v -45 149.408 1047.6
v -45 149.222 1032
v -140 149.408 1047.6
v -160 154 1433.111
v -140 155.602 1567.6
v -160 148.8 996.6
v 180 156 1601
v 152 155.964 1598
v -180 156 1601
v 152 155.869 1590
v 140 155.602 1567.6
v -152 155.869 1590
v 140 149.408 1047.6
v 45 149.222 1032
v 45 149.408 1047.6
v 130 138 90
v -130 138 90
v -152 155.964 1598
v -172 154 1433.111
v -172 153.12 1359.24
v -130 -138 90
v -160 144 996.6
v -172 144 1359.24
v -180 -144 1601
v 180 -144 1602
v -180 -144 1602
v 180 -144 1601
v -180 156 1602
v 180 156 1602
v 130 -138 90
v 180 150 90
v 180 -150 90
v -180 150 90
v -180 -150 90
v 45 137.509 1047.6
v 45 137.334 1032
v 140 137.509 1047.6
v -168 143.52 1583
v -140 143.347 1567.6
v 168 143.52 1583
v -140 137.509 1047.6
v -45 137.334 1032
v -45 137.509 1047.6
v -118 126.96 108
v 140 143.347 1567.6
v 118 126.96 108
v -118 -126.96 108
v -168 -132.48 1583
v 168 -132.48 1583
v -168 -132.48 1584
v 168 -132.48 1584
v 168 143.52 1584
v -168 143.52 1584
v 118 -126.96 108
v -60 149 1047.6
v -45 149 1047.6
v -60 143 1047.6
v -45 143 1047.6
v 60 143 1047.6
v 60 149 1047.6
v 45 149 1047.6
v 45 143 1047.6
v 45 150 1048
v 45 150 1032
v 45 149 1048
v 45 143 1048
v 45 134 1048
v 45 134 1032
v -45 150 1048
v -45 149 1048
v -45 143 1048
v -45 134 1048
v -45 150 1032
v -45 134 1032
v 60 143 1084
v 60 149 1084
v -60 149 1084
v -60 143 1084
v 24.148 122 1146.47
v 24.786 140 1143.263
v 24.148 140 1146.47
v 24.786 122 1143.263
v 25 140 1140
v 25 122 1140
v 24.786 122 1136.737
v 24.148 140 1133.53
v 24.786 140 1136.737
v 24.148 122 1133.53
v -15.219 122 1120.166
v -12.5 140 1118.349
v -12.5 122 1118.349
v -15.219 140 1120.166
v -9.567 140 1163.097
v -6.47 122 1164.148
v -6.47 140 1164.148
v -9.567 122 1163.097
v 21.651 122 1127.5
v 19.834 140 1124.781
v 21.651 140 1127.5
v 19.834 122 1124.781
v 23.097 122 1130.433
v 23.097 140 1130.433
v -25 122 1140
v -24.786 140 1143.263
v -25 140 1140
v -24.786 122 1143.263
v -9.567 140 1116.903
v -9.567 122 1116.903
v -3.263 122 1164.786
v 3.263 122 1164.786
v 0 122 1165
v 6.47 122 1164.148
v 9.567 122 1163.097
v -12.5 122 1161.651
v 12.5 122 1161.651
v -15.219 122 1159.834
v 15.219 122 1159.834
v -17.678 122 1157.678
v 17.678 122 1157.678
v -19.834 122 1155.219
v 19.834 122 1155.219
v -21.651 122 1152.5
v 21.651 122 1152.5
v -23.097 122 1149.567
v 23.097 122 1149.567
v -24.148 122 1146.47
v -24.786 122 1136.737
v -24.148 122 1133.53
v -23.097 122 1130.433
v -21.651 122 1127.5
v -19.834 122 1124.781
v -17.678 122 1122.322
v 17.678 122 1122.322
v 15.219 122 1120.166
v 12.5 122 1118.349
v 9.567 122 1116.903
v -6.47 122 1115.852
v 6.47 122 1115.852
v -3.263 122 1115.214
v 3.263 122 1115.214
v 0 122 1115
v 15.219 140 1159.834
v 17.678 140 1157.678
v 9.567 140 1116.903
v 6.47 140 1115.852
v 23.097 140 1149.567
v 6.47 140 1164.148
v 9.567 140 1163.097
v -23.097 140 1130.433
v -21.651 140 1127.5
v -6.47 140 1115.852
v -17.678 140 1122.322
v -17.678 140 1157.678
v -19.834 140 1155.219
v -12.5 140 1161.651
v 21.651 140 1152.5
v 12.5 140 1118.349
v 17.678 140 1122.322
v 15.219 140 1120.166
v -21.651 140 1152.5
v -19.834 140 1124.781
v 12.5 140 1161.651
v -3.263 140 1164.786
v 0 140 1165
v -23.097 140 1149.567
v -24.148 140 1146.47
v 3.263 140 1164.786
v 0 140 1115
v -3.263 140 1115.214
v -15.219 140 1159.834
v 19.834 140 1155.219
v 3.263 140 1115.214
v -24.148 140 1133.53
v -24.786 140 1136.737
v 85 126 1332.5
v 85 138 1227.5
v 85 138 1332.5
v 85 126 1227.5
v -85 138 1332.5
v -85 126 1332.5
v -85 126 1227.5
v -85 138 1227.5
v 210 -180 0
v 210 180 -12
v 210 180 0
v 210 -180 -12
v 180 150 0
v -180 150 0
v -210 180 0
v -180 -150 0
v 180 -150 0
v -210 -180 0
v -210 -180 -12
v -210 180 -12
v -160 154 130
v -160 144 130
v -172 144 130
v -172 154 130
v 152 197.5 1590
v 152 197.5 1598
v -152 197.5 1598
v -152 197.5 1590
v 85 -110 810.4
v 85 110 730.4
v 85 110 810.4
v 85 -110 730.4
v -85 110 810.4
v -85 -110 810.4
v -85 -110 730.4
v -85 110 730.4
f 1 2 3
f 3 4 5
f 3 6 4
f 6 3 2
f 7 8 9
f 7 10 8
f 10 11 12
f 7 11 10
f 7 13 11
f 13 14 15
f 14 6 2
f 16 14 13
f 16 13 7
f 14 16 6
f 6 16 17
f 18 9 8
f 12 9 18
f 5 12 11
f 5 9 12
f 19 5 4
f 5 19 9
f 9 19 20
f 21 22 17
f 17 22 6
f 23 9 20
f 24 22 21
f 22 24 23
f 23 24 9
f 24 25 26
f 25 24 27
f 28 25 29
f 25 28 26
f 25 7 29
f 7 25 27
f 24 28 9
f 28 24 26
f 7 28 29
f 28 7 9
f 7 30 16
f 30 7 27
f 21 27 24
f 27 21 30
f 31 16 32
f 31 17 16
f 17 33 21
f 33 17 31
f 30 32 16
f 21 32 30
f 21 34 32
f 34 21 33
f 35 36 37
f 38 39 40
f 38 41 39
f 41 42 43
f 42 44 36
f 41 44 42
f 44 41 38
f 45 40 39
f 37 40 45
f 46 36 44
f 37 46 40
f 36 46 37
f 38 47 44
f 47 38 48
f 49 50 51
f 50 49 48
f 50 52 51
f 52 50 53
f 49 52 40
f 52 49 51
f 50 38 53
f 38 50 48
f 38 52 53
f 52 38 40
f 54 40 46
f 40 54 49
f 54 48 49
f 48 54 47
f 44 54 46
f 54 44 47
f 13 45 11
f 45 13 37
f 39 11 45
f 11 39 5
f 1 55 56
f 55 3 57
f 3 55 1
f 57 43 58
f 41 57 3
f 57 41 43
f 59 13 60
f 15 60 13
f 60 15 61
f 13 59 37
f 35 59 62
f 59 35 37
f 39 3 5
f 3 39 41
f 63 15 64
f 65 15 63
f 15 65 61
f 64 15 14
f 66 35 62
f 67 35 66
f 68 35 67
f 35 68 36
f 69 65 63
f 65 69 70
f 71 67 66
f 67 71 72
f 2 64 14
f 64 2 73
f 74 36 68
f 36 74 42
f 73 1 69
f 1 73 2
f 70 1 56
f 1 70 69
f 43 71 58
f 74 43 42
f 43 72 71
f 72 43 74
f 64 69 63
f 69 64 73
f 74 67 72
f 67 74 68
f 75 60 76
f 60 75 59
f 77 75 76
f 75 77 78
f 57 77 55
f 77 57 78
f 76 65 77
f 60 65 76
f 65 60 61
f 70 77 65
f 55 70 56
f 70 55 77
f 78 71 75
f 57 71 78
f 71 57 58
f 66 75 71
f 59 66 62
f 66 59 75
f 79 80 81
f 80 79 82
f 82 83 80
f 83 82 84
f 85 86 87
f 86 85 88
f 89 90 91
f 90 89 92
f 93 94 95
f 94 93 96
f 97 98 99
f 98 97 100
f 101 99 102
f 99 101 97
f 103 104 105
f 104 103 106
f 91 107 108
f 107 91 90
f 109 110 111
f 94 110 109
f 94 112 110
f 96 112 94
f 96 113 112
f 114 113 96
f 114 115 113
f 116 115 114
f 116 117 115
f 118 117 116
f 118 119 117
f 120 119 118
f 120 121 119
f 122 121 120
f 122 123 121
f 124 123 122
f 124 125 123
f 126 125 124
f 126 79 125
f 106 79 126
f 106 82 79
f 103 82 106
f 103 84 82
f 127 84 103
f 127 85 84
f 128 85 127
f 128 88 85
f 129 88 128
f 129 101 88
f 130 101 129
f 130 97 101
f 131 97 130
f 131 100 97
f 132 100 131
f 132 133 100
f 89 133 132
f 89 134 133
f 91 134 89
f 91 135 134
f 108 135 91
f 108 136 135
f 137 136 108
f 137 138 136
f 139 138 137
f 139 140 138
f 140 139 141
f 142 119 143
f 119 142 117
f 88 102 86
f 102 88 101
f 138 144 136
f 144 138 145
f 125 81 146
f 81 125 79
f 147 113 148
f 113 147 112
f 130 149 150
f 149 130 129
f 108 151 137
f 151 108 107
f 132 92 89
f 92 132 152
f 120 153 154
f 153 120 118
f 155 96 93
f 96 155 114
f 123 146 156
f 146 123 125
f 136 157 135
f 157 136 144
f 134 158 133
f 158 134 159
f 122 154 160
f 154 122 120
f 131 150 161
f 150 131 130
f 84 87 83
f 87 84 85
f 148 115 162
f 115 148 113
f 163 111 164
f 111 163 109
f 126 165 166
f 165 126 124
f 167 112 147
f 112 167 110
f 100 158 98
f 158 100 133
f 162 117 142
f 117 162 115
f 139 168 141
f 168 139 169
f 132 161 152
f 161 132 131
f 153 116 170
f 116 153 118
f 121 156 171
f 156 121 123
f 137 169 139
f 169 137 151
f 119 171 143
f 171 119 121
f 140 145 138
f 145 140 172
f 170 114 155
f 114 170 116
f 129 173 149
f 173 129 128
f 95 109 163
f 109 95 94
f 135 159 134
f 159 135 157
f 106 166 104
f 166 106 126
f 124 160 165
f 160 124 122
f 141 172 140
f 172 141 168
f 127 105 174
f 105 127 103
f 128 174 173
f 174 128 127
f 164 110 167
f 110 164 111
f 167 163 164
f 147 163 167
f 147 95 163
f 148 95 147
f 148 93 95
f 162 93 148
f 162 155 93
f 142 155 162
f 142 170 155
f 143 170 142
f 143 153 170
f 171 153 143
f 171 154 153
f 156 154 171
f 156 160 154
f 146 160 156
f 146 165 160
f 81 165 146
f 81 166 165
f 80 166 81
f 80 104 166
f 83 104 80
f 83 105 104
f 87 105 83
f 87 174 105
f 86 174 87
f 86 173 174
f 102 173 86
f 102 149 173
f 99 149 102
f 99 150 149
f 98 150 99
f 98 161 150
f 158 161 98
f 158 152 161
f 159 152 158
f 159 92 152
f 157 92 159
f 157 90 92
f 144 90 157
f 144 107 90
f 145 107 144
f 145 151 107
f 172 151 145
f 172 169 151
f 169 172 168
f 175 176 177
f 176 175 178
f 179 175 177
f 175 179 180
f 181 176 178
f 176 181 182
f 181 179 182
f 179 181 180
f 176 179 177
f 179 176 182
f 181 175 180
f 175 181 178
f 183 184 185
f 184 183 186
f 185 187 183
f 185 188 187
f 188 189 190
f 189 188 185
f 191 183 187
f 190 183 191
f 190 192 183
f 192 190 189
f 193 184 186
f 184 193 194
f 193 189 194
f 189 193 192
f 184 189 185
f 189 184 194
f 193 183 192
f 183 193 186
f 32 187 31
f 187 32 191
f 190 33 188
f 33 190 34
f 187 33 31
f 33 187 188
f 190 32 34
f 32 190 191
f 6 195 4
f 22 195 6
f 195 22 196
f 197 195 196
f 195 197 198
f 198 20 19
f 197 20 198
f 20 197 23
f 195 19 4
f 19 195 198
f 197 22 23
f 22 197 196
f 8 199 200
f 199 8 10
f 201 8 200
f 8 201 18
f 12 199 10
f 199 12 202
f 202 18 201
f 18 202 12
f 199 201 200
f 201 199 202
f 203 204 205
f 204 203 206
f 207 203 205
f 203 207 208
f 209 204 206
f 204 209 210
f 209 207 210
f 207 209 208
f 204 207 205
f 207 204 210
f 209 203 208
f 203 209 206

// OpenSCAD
// AETHER Lane — kiosko ingreso / salida (cotas en mm)
// OpenSCAD: F6 render, File > Export > STL
//
// Parámetros:
variant   = "pylon";   // "pylon" | "compact" | "wall"
face      = "ingreso"; // "ingreso" | "salida"
explode   = 0;         // 0 cerrado … 1 despiece

$fn = 48;

function spec(v) =
    v == "pylon"   ? [1620, 360, 260, 300, 90, 12, 420, 360] :
    v == "compact" ? [1280, 260, 200, 220, 70, 10, 320, 280] :
                     [520,  300, 300, 140, 0,  6,  480, 280];
// H, Wf, Wr, D, plinthH, plateT, plateW, plateD

S      = spec(variant);
H      = S[0];
Wf     = S[1];
Wr     = S[2];
D      = S[3];
PH     = S[4];
PT     = S[5];
PW     = S[6];
PD     = S[7];
WALL   = variant == "wall";
BODY_H = WALL ? H : H - PH - 18;
BODY_Z = WALL ? 0 : PH;

lcd_c  = variant == "pylon" ? 1280 : variant == "compact" ? 1160 : 360;
btn_c  = variant == "pylon" ? 1140 : variant == "compact" ? 1060 : 250;
slot_c = variant == "pylon" ? 1040 : variant == "compact" ?  980 : 180;
scan_c = variant == "pylon" ? 1100 : variant == "compact" ? 1030 : 220;
ck_w   = variant == "pylon" ? 280  : variant == "compact" ? 210  : 240;
ck_h   = variant == "pylon" ? 520  : variant == "compact" ? 460  : 400;
ck_bot = lcd_c - ck_h * 0.62;

ex = explode;

module plate() {
    translate([0, 0, -PT/2 - ex * 70])
        cube([PW, PD, PT], center = true);
}

module plinth() {
    if (!WALL)
        translate([0, 0, PH/2])
            cube([Wf, D, PH], center = true);
}

module tapered(h, wf, wr, d) {
    hull() {
        translate([0, 0, 0.5])
            cube([wr, d * 0.92, 1], center = true);
        translate([0, (d - d * 0.92) / 4, h - 0.5])
            cube([wf, d, 1], center = true);
    }
}

module blade() {
    translate([-Wf/2 + 8 - ex * 90, D/2 - 6, BODY_Z + 40])
        cube([12, 10, BODY_H - 80]);
}

module visor() {
    translate([0, D/2 + 20 + ex * 40, BODY_Z + BODY_H - 8 + ex * 90])
        cube([ck_w + 24, 55, 8], center = true);
}

module cockpit_cut() {
    translate([0, D/2 + 1, BODY_Z + ck_bot + ck_h/2])
        cube([ck_w, 60, ck_h], center = true);
}

module shell() {
    difference() {
        translate([0, 0, BODY_Z])
            tapered(BODY_H, Wf, Wr, D);
        translate([0, 0, BODY_Z + 18])
            tapered(BODY_H - 36, Wf - 24, Wr - 24, D - 24);
        cockpit_cut();
        // service door recess
        translate([0, -D/2, BODY_Z + BODY_H/2])
            cube([Wr - 40, 8, BODY_H - 80], center = true);
    }
}

module lcd() {
    translate([0, D/2 - 18 + ex * 160, lcd_c])
        cube([170, 12, 105], center = true);
}

module button() {
    translate([0, D/2 - 10 + ex * 190, btn_c])
        rotate([90, 0, 0])
            cylinder(h = 18, d = 50);
}

module slot() {
    translate([0, D/2 - 8 + ex * 210, slot_c])
        cube([90, 16, 16], center = true);
    translate([0, D/2 - 4 + ex * 200, slot_c + 22])
        cube([120, 6, 44], center = true);
}

module scanner_window() {
    translate([0, D/2 - 12 + ex * 190, scan_c])
        cube([90, 8, 46], center = true);
}

module face_modules() {
    lcd();
    if (face == "ingreso") {
        button();
        slot();
    } else {
        scanner_window();
    }
}

module internals() {
    translate([0, 0 + ex * 140, BODY_Z + BODY_H * 0.45])
        cube([min(Wf, 220) - 50, D - 80, 80], center = true);
}

module aether() {
    color([0.35, 0.38, 0.40]) plate();
    color([0.18, 0.20, 0.22]) plinth();
    color([0.16, 0.18, 0.20]) shell();
    color([0.24, 0.88, 0.84]) blade();
    color([0.72, 0.75, 0.78]) visor();
    color([0.10, 0.12, 0.14]) face_modules();
    color([0.40, 0.42, 0.45]) internals();
}

aether();
